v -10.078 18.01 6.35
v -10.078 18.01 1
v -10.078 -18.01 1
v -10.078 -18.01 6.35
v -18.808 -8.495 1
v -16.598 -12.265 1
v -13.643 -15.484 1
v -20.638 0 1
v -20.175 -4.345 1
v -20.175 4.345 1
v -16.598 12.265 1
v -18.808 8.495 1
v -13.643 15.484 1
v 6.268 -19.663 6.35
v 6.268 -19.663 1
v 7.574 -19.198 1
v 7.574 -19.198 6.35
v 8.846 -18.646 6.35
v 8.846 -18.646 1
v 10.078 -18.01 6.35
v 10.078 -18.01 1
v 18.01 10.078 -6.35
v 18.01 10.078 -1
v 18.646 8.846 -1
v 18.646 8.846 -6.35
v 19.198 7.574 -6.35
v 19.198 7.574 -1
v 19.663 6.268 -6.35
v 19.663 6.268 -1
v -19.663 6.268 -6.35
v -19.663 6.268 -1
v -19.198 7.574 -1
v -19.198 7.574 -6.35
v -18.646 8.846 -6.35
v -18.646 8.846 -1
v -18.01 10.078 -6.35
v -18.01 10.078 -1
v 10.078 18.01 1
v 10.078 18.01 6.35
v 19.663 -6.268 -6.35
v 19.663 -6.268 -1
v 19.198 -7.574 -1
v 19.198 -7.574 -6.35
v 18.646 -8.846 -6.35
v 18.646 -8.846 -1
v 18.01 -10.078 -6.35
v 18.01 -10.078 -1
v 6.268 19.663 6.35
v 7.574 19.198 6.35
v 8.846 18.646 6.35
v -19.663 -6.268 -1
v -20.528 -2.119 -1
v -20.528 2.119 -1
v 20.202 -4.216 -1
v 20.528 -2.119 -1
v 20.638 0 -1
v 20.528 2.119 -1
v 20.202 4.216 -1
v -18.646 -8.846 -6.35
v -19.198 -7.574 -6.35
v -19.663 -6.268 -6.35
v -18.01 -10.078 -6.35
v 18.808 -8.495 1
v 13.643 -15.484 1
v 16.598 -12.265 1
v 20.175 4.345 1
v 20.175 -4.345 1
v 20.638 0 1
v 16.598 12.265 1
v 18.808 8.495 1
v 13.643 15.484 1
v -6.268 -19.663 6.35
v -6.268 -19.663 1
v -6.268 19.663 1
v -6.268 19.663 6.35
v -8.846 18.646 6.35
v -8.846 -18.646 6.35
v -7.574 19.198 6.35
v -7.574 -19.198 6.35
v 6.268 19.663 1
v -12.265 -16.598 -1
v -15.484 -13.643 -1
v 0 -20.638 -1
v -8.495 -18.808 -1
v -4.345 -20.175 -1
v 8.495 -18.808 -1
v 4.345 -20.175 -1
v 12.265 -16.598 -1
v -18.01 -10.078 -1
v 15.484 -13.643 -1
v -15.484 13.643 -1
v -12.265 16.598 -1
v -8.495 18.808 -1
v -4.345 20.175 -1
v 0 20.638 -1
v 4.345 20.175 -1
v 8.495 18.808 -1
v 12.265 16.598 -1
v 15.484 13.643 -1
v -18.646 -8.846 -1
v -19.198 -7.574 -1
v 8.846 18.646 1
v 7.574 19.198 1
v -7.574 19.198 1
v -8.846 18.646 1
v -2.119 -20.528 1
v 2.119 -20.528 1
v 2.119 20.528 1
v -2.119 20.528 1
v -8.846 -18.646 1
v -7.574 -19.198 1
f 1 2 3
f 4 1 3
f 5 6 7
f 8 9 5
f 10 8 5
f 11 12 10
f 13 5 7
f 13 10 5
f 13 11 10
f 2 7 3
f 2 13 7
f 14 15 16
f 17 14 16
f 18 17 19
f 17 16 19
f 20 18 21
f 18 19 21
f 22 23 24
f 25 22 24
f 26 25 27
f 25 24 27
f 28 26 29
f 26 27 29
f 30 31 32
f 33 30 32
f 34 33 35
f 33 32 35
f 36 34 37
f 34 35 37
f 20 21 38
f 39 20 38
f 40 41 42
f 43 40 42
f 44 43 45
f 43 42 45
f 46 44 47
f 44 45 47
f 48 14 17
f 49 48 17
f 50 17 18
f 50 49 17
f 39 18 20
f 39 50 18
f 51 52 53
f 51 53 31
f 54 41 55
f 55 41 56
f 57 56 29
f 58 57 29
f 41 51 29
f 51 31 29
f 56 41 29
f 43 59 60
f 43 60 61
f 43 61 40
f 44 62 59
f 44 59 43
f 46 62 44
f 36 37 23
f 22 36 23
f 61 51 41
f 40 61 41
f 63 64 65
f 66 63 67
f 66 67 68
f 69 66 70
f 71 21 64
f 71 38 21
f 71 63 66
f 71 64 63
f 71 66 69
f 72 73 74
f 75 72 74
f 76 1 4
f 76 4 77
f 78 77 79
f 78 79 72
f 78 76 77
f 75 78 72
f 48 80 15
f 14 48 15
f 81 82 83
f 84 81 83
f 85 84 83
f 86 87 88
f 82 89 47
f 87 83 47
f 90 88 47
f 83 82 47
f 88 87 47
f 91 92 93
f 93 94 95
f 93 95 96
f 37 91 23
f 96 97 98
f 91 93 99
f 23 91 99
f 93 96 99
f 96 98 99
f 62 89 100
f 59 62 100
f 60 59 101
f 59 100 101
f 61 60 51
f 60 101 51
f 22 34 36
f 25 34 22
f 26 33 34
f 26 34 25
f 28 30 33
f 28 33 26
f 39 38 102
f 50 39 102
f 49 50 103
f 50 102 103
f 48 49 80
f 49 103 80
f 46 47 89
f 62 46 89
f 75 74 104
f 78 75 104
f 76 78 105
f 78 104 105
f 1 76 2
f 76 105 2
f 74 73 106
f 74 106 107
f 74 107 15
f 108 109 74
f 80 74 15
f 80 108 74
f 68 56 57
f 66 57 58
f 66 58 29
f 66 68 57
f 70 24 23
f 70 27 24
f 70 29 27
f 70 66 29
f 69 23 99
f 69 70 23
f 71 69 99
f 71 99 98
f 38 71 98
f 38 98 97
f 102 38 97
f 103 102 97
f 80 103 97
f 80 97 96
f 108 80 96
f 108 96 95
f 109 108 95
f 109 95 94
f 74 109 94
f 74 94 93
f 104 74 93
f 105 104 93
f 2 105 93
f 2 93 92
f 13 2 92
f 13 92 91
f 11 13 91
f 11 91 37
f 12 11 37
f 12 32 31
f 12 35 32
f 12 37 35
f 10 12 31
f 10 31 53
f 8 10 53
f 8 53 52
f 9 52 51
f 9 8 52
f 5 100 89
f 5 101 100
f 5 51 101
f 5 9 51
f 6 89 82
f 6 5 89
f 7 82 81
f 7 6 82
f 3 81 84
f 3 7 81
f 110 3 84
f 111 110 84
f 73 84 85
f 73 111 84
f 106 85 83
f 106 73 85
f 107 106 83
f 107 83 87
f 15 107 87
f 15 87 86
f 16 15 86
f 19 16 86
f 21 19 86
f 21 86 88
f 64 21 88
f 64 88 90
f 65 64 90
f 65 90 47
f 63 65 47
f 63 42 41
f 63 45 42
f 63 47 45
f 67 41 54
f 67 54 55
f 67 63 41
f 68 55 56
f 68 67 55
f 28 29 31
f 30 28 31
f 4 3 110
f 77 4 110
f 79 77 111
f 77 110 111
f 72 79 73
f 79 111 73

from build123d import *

# Parameters (mm, degrees)
F0_R          = 20.6375
F1_DEPTH      = 1
F1_DEPTH_BACK = 1
F3_DEPTH      = 5.35
F5_DEPTH      = 5.35


with BuildPart() as f1:
    # F0 (on Top) → F1 (new body, two sides)
    with BuildSketch(Plane.XY) as f1_sk:
        Circle(F0_R)
    extrude(amount=F1_DEPTH)
    extrude(f1_sk.sketch, amount=-F1_DEPTH_BACK)

    # F2 (on face) → F3 (join)
    with BuildSketch(Plane.XY.offset(1)):
        with BuildLine():
            Line((-10.0775, 18.009731), (-10.0775, -18.009731))
            ThreePointArc((-10.0775, -18.009731), (-8.214189, -18.93234), (-6.2675, -19.662778))
            Line((-6.2675, -19.662778), (-6.2675, 19.662778))
            ThreePointArc((-6.2675, 19.662778), (-8.214189, 18.93234), (-10.0775, 18.009731))
        make_face()
        with BuildLine():
            Line((6.2675, 19.662778), (6.2675, -19.662778))
            ThreePointArc((6.2675, -19.662778), (8.214189, -18.93234), (10.0775, -18.009731))
            Line((10.0775, -18.009731), (10.0775, 18.009731))
            ThreePointArc((10.0775, 18.009731), (8.214189, 18.93234), (6.2675, 19.662778))
        make_face()
    extrude(amount=F3_DEPTH)

    # F4 (on face) → F5 (join)
    with BuildSketch(Plane(origin=(0, 0, -1), x_dir=(1, 0, 0), z_dir=(0, 0, -1))):
        with BuildLine():
            Line((18.009731, 10.0775), (-18.009731, 10.0775))
            ThreePointArc((-18.009731, 10.0775), (-18.93234, 8.214189), (-19.662778, 6.2675))
            Line((-19.662778, 6.2675), (19.662778, 6.2675))
            ThreePointArc((19.662778, 6.2675), (18.93234, 8.214189), (18.009731, 10.0775))
        make_face()
        with BuildLine():
            Line((19.662778, -6.2675), (-19.662778, -6.2675))
            ThreePointArc((-19.662778, -6.2675), (-18.93234, -8.214189), (-18.009731, -10.0775))
            Line((-18.009731, -10.0775), (18.009731, -10.0775))
            ThreePointArc((18.009731, -10.0775), (18.93234, -8.214189), (19.662778, -6.2675))
        make_face()
    extrude(amount=F5_DEPTH)


solid = f1.part
